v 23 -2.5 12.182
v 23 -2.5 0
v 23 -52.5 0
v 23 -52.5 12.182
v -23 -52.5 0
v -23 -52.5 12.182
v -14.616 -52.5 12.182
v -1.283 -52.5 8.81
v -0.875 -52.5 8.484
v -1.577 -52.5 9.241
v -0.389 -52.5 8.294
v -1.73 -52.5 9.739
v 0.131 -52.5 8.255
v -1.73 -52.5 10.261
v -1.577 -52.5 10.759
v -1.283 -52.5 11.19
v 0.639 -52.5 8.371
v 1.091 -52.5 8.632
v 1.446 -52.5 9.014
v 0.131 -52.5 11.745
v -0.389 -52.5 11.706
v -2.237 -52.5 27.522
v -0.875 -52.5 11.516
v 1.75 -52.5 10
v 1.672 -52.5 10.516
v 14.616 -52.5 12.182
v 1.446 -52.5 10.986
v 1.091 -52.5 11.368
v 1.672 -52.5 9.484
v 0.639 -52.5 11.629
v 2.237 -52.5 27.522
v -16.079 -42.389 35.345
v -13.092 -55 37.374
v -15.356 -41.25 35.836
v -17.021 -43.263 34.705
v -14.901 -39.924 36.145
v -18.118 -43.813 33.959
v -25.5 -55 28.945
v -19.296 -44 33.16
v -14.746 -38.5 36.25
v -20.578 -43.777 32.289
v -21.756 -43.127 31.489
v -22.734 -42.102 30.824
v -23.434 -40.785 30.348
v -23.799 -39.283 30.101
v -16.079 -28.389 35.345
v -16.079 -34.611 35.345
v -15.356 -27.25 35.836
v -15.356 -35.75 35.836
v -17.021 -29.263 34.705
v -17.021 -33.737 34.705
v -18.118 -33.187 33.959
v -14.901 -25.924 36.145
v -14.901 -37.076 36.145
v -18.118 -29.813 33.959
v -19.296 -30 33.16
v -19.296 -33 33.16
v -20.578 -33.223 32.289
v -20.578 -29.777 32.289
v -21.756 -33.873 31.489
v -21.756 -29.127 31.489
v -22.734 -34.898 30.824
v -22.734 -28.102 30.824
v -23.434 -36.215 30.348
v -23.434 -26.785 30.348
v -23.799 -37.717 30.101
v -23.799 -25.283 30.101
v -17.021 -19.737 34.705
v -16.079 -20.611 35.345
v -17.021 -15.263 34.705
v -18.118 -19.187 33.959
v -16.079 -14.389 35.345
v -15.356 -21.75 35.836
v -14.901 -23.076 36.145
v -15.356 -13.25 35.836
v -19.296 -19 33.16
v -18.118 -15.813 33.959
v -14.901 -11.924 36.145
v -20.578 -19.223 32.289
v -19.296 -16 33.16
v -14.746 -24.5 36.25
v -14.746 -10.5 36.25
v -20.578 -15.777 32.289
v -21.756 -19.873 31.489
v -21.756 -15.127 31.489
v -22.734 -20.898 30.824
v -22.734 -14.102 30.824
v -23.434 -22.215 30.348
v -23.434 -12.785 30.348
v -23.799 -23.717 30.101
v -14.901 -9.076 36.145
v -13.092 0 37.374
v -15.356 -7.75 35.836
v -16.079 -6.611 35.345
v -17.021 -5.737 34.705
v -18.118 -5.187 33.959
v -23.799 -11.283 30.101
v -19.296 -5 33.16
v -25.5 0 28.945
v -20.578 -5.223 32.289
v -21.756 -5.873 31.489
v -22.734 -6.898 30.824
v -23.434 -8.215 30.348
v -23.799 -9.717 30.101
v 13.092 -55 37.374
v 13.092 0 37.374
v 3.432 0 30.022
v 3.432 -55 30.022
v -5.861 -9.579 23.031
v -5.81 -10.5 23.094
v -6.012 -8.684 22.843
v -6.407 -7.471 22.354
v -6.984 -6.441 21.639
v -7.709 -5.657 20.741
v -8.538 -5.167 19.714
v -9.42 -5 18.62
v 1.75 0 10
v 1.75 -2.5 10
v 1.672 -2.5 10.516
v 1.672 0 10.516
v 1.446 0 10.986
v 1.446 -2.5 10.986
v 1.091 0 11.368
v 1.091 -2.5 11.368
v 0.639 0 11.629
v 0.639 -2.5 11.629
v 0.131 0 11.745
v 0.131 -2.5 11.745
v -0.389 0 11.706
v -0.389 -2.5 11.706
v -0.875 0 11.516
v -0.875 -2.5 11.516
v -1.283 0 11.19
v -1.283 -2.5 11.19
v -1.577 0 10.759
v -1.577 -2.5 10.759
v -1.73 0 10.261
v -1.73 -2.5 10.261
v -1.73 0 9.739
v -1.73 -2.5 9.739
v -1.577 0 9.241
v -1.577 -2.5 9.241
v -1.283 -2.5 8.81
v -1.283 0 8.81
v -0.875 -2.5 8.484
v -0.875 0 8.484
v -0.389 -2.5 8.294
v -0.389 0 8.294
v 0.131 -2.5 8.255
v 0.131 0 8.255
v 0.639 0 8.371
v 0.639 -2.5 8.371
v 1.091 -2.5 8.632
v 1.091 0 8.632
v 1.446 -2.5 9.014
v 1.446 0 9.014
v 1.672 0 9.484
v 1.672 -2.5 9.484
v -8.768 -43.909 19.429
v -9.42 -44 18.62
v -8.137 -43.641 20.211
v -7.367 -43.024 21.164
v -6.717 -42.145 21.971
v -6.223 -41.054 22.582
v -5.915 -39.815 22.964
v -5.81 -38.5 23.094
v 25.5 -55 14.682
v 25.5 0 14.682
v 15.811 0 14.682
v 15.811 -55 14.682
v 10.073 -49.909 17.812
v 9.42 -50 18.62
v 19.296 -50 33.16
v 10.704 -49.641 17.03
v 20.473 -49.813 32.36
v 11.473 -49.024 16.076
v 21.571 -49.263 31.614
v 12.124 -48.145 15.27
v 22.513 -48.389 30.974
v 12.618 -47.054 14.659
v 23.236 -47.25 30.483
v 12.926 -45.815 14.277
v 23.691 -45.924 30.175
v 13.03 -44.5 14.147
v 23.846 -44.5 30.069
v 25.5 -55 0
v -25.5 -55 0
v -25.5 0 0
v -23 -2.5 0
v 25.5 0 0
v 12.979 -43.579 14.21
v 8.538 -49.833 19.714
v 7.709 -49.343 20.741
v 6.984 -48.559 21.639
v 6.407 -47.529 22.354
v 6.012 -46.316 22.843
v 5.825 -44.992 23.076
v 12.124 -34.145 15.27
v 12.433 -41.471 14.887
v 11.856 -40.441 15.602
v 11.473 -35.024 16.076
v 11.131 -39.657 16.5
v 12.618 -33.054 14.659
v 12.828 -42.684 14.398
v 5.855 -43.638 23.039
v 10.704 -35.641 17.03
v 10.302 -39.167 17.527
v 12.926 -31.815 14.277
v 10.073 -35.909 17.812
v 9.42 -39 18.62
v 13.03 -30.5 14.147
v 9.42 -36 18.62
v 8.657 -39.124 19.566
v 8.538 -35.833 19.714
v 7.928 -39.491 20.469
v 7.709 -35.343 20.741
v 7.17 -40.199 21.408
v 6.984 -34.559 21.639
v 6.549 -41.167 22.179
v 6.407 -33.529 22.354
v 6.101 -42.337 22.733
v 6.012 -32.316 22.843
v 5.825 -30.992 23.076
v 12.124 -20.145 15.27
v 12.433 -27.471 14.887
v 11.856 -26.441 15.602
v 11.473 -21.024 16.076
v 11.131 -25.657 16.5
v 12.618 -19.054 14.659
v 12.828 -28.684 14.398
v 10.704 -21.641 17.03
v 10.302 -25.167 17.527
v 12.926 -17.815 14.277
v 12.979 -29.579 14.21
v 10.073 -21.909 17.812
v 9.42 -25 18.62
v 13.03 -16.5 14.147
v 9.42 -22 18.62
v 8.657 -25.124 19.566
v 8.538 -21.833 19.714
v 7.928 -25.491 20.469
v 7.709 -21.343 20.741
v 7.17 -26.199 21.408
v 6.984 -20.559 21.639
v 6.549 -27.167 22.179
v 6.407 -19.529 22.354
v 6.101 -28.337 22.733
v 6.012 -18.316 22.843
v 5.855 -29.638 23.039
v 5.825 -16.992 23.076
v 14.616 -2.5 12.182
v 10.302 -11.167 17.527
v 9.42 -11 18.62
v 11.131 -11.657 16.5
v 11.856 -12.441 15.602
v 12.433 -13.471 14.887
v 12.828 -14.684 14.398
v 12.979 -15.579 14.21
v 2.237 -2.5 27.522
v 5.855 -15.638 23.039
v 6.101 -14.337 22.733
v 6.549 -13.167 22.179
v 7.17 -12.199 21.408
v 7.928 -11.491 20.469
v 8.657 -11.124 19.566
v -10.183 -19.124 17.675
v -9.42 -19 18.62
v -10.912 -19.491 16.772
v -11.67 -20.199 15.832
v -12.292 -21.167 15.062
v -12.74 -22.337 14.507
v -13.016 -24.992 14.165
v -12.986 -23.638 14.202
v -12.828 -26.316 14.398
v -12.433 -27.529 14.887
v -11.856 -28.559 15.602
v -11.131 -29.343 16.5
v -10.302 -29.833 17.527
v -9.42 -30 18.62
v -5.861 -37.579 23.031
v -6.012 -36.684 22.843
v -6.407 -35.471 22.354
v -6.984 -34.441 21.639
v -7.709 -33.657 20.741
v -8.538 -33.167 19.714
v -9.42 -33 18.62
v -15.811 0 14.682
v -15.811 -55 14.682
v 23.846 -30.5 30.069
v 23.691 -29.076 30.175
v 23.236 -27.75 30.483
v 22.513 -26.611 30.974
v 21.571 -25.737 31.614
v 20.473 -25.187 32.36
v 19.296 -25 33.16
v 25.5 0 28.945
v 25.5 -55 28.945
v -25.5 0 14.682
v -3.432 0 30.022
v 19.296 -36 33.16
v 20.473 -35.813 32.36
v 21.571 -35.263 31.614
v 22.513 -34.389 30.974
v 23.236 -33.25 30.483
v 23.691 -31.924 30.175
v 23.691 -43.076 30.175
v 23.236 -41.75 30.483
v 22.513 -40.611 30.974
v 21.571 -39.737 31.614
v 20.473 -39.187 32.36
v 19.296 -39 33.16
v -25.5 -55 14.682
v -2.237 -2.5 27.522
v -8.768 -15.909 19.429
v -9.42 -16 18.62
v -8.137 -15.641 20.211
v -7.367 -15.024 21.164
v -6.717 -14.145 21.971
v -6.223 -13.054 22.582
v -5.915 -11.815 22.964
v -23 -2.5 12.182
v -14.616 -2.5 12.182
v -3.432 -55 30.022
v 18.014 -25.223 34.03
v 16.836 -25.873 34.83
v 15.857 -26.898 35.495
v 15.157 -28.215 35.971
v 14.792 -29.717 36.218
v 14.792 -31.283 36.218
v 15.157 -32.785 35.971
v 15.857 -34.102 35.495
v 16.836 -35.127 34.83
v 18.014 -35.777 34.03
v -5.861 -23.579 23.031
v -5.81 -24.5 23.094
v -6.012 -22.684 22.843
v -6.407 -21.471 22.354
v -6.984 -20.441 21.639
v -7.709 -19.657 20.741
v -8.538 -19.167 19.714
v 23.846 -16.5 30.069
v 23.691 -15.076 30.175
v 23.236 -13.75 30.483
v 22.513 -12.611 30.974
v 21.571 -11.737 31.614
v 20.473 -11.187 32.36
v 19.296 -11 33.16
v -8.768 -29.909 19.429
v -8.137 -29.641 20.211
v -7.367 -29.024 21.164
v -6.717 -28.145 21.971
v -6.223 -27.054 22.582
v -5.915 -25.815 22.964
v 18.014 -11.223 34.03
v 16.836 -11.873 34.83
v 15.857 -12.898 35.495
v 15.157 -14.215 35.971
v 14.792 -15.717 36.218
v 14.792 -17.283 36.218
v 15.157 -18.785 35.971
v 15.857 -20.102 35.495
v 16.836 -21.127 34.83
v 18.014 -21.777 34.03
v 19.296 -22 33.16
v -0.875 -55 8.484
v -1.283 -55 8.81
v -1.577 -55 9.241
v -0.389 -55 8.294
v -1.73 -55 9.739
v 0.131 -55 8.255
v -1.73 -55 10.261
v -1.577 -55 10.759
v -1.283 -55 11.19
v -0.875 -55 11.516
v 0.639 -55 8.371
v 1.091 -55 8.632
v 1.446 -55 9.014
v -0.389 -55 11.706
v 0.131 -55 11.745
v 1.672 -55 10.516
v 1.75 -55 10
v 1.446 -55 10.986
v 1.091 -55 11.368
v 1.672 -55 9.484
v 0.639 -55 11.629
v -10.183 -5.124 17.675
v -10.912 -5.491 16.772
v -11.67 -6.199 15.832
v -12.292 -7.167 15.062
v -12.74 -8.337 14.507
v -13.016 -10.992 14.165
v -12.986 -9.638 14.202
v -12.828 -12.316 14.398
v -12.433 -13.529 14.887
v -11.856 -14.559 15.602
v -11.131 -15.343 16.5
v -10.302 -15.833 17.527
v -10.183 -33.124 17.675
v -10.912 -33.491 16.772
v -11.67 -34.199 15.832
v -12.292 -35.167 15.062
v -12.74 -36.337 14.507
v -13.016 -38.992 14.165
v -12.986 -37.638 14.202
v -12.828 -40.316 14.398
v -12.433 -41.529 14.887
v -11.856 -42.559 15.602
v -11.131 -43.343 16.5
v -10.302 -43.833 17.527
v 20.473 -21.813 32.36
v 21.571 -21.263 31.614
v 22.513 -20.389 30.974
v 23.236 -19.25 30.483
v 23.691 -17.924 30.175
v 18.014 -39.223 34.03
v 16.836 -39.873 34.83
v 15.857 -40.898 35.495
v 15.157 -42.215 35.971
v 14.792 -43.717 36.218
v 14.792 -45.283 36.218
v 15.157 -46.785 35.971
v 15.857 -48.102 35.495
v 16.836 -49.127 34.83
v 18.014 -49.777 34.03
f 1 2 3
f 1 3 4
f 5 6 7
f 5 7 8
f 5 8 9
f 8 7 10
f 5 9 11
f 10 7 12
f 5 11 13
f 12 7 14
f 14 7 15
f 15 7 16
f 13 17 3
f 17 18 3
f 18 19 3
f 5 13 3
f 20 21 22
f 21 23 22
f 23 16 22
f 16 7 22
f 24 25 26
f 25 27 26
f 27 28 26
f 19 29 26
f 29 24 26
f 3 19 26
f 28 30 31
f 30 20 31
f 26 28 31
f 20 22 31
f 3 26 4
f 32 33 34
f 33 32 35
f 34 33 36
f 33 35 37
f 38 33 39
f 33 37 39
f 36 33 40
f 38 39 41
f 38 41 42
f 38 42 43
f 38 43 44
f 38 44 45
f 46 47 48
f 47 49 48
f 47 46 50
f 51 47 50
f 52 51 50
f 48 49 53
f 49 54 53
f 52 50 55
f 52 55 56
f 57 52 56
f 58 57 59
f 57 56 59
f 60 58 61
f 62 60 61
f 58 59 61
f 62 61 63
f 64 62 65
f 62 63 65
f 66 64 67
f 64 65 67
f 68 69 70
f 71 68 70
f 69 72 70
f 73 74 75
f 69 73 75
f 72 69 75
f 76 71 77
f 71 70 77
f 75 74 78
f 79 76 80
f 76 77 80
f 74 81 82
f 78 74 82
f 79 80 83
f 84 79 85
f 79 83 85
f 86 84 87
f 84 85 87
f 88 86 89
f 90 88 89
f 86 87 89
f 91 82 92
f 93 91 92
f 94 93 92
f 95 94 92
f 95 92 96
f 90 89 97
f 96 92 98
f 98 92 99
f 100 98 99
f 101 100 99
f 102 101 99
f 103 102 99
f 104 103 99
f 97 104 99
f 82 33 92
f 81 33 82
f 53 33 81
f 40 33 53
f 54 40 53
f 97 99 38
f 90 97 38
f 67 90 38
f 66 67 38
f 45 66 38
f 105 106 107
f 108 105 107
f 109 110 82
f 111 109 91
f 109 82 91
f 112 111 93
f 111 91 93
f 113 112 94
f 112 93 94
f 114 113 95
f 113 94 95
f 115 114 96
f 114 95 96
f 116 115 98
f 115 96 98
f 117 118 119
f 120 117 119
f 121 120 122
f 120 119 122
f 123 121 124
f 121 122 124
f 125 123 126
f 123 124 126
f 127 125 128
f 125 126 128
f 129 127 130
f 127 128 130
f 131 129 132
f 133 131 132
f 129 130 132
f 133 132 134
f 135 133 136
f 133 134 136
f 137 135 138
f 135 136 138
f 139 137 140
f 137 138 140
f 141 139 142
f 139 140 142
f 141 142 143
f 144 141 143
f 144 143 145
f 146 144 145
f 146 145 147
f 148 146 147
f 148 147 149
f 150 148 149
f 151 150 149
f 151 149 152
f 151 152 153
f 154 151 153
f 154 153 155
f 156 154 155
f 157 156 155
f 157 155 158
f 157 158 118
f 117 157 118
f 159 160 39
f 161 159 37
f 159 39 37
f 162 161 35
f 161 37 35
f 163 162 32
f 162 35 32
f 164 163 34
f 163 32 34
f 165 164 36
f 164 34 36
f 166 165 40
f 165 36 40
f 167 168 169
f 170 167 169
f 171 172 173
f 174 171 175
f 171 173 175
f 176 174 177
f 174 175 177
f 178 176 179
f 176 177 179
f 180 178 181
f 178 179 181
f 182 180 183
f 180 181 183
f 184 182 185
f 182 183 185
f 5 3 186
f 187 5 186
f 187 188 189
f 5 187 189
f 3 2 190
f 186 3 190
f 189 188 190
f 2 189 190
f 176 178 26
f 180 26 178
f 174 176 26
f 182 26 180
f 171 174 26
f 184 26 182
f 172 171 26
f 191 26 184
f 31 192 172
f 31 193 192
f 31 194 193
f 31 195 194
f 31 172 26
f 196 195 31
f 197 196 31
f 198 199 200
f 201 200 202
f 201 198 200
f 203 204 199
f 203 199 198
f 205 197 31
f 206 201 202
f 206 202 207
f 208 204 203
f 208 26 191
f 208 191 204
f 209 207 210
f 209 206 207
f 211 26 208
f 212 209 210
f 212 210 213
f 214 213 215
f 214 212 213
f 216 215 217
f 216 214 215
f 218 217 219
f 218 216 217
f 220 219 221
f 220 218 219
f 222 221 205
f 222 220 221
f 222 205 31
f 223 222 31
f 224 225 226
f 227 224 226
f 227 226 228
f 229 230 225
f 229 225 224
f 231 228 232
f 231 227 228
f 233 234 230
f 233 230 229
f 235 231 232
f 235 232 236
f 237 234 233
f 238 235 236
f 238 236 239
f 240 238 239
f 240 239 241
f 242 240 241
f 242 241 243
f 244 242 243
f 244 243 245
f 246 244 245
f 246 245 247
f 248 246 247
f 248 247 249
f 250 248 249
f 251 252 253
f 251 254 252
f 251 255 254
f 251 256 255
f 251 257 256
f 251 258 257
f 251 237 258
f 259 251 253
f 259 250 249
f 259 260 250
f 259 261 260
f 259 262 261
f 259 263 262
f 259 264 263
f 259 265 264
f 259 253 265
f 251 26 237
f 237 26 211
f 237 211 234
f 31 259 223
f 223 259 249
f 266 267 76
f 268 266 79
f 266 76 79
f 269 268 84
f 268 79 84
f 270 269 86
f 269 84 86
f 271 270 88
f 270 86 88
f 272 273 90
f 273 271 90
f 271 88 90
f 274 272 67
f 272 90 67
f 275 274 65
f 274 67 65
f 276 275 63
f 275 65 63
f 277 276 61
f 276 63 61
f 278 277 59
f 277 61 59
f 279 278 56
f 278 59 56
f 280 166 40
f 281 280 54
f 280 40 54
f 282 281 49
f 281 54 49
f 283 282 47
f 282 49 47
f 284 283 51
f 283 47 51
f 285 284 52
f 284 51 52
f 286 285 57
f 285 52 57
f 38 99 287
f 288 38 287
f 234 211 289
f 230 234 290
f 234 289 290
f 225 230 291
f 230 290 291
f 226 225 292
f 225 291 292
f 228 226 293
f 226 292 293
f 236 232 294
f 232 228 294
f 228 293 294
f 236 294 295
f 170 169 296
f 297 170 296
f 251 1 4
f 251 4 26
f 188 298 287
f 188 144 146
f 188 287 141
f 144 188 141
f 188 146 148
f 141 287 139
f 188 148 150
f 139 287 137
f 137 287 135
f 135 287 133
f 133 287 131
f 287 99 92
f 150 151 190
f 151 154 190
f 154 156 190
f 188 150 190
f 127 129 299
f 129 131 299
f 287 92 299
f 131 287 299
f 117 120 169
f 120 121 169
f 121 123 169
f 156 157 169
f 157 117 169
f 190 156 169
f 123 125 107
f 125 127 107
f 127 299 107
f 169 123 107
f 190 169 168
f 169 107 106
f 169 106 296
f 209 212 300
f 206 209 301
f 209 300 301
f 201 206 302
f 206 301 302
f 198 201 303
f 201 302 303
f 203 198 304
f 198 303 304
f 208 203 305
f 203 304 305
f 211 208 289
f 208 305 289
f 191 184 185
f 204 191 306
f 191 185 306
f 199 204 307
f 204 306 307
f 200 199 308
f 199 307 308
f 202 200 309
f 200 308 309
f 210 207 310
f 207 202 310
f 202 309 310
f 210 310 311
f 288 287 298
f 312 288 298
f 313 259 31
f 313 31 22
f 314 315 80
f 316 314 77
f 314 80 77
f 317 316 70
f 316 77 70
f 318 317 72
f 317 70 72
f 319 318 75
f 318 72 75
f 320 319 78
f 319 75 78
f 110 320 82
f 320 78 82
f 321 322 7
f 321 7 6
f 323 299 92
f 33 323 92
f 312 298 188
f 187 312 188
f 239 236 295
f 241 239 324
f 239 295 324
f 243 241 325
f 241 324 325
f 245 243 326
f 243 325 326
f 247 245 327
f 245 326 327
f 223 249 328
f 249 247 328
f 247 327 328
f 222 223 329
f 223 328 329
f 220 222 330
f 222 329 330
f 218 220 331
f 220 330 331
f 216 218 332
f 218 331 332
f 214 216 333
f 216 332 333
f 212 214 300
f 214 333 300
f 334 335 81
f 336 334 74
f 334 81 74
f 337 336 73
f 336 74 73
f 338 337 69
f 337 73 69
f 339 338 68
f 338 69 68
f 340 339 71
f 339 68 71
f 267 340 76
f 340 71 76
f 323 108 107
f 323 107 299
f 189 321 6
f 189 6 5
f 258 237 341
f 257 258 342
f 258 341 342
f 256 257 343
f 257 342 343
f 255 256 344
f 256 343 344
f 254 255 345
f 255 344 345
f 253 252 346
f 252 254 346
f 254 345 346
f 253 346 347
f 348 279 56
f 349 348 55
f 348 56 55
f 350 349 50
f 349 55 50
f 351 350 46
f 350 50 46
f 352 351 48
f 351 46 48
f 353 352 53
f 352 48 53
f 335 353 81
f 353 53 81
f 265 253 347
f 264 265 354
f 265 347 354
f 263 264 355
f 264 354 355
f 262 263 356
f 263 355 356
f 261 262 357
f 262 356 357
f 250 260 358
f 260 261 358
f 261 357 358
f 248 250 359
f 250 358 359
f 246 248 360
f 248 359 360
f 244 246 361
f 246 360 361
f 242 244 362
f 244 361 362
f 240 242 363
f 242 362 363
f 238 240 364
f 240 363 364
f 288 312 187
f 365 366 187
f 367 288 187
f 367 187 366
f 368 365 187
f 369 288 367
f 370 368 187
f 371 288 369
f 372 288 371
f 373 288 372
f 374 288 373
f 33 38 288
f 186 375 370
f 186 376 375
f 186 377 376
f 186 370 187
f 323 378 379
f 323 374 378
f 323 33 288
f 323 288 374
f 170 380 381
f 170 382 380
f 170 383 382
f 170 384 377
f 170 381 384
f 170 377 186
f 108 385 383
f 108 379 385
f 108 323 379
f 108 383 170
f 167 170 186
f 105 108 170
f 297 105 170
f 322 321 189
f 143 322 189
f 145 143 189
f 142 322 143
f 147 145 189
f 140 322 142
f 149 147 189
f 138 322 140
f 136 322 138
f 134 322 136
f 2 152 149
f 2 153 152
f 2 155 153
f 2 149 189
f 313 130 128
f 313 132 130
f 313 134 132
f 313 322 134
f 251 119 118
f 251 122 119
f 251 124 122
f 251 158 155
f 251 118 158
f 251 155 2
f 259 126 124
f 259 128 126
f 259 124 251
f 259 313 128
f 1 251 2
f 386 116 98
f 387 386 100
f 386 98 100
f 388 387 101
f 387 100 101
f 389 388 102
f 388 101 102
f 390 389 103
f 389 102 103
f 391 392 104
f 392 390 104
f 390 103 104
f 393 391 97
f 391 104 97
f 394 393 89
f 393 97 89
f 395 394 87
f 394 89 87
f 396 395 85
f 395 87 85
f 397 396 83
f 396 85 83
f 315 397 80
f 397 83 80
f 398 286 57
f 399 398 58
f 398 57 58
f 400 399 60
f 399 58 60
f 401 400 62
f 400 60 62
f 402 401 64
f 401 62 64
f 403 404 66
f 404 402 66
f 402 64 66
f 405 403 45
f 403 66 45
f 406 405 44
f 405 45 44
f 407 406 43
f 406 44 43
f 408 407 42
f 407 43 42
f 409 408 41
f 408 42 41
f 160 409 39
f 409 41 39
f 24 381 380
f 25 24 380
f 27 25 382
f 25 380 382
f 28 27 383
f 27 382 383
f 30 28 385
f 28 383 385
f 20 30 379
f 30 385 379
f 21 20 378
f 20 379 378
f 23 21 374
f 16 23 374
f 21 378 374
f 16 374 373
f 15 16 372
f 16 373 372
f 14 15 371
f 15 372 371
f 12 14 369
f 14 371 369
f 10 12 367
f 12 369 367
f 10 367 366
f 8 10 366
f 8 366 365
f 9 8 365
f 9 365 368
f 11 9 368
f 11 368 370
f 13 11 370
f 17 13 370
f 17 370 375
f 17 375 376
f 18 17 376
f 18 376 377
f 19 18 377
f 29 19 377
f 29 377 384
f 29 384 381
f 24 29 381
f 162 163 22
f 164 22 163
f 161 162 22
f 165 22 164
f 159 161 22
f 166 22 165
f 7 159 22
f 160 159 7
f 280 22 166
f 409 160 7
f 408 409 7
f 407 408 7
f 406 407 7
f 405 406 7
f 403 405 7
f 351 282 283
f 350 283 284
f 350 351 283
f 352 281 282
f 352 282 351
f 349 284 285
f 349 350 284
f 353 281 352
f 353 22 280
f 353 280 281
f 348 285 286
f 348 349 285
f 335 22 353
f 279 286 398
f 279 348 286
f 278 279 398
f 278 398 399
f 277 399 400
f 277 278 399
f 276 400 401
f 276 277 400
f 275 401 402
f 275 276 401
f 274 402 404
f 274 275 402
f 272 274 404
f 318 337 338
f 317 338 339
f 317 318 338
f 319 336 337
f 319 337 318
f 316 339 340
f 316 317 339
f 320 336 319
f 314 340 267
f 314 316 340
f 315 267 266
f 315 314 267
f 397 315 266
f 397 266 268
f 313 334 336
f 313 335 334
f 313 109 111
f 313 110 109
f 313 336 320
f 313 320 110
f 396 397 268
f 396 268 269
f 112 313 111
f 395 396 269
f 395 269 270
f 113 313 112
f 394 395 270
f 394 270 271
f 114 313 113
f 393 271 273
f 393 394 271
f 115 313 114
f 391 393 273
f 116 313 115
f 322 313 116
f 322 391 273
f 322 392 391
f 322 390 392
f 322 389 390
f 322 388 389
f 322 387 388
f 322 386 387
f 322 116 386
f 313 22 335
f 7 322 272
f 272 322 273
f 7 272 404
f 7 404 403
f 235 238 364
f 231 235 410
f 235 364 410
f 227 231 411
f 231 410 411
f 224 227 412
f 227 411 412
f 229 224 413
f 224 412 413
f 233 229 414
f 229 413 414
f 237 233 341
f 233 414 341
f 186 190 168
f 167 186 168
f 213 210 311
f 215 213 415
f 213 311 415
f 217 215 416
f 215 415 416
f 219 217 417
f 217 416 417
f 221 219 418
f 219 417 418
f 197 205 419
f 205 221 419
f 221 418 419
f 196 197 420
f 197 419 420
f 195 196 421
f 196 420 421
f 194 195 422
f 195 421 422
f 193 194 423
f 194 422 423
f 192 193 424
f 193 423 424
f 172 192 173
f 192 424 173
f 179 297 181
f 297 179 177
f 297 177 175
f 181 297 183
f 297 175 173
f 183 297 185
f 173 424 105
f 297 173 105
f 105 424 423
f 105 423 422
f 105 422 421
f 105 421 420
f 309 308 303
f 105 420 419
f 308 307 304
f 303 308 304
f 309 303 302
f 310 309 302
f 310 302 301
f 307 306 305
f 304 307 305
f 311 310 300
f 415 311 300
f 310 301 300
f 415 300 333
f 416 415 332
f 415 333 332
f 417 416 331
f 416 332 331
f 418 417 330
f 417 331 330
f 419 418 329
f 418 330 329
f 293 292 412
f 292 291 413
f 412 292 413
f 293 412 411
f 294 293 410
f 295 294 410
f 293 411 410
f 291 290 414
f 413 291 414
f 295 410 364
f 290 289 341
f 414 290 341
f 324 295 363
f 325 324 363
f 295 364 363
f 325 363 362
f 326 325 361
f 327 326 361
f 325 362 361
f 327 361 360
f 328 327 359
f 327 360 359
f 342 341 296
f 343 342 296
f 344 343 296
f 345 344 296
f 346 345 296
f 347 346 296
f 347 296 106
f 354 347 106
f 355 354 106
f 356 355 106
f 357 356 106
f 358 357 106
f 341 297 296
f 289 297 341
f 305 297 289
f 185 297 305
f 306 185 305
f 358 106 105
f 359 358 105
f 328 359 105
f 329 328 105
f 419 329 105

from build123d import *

# Parameters (mm, degrees)
F1_DEPTH = 55
F2_T     = -2.5
F3_DEPTH = 55
F5_DEPTH = 25
F7_DEPTH = 25
F8_R     = 1.75
F9_DEPTH = 60


with BuildPart() as f1:
    # F0 (on Front) → F1 (new body)
    with BuildSketch(Plane.XZ):
        Polygon((0, 30.0219481358), (0, 0), (25.5, 0), (25.5, 14.6816842611), (15.8114124709, 14.6816842611), (3.4315507477, 30.0219481358), align=None)
        Polygon((-25.5, 0), (0, 0), (0, 30.0219481358), (-3.4315507477, 30.0219481358), (-15.8114124709, 14.6816842611), (-25.5, 14.6816842611), align=None)
    extrude(amount=F1_DEPTH)

    # F2
    f2_openings = [f1.faces().sort_by_distance(p)[0] for p in [
        (0, -27.5, 0),
    ]]
    offset(amount=F2_T, openings=f2_openings, kind=Kind.INTERSECTION)

    # F0 (on Front) → F3 (join)
    with BuildSketch(Plane.XZ):
        Polygon((13.0917496571, 37.3736836002), (3.4315507477, 30.0219481358), (15.8114124709, 14.6816842611), (25.5, 28.9454380277), align=None)
        Polygon((-15.8114124709, 14.6816842611), (-3.4315507477, 30.0219481358), (-13.0917496571, 37.3736836002), (-25.5, 28.9454380277), align=None)
    extrude(amount=F3_DEPTH)

    # F4 (on face) → F5 (cut)
    with BuildSketch(Plane(origin=(21.5044814121, 0, 31.6593752), x_dir=(0.8272166895, 0, -0.5618830382), z_dir=(0.5618830382, 0, 0.8272166895))):
        with BuildLine():
            ThreePointArc((-2.6699250771, -39), (-8.1699250771, -44.5), (-2.6699250771, -50))
            Line((-2.6699250771, -50), (-2.6699250771, -39))
        make_face()
        with BuildLine():
            Line((-2.6699250771, -39), (-2.6699250771, -50))
            ThreePointArc((-2.6699250771, -50), (1.2191622194, -48.3890872965), (2.8300749229, -44.5))
            ThreePointArc((2.8300749229, -44.5), (1.2191622194, -40.6109127035), (-2.6699250771, -39))
        make_face()
        with BuildLine():
            ThreePointArc((-2.6699250771, -25), (-8.1699250771, -30.5), (-2.6699250771, -36))
            Line((-2.6699250771, -36), (-2.6699250771, -25))
        make_face()
        with BuildLine():
            Line((-2.6699250771, -25), (-2.6699250771, -36))
            ThreePointArc((-2.6699250771, -36), (1.2191622194, -34.3890872965), (2.8300749229, -30.5))
            ThreePointArc((2.8300749229, -30.5), (1.2191622194, -26.6109127035), (-2.6699250771, -25))
        make_face()
        with BuildLine():
            Line((-2.6699250771, -22), (-2.6699250771, -11))
            ThreePointArc((-2.6699250771, -11), (-8.1699250771, -16.5), (-2.6699250771, -22))
        make_face()
        with BuildLine():
            ThreePointArc((2.8300749229, -16.5), (1.2191622194, -12.6109127035), (-2.6699250771, -11))
            Line((-2.6699250771, -11), (-2.6699250771, -22))
            ThreePointArc((-2.6699250771, -22), (1.2191622194, -20.3890872965), (2.8300749229, -16.5))
        make_face()
    extrude(amount=-F5_DEPTH, mode=Mode.SUBTRACT)

    # F6 (on face) → F7 (cut)
    with BuildSketch(Plane(origin=(-21.5044814121, 0, 31.6593752), x_dir=(0.8272166895, 0, 0.5618830382), z_dir=(-0.5618830382, 0, 0.8272166895))):
        with BuildLine():
            ThreePointArc((8.1699250771, -10.5), (6.5590123736, -6.6109127035), (2.6699250771, -5))
            Line((2.6699250771, -5), (2.6699250771, -16))
            ThreePointArc((2.6699250771, -16), (6.5590123736, -14.3890872965), (8.1699250771, -10.5))
        make_face()
        with BuildLine():
            Line((2.6699250771, -16), (2.6699250771, -5))
            ThreePointArc((2.6699250771, -5), (-2.8300749229, -10.5), (2.6699250771, -16))
        make_face()
        with BuildLine():
            ThreePointArc((8.1699250771, -24.5), (6.5590123736, -20.6109127035), (2.6699250771, -19))
            Line((2.6699250771, -19), (2.6699250771, -30))
            ThreePointArc((2.6699250771, -30), (6.5590123736, -28.3890872965), (8.1699250771, -24.5))
        make_face()
        with BuildLine():
            Line((2.6699250771, -30), (2.6699250771, -19))
            ThreePointArc((2.6699250771, -19), (-2.8300749229, -24.5), (2.6699250771, -30))
        make_face()
        with BuildLine():
            Line((2.6699250771, -33), (2.6699250771, -44))
            ThreePointArc((2.6699250771, -44), (6.5590123736, -42.3890872965), (8.1699250771, -38.5))
            ThreePointArc((8.1699250771, -38.5), (6.5590123736, -34.6109127035), (2.6699250771, -33))
        make_face()
        with BuildLine():
            ThreePointArc((2.6699250771, -33), (-2.8300749229, -38.5), (2.6699250771, -44))
            Line((2.6699250771, -44), (2.6699250771, -33))
        make_face()
    extrude(amount=-F7_DEPTH, mode=Mode.SUBTRACT)

    # F8 (on face) → F9 (cut)
    with BuildSketch(Plane.XZ.offset(55)):
        with Locations((0, 10)):
            Circle(F8_R)
    extrude(amount=-F9_DEPTH, mode=Mode.SUBTRACT)


solid = f1.part
